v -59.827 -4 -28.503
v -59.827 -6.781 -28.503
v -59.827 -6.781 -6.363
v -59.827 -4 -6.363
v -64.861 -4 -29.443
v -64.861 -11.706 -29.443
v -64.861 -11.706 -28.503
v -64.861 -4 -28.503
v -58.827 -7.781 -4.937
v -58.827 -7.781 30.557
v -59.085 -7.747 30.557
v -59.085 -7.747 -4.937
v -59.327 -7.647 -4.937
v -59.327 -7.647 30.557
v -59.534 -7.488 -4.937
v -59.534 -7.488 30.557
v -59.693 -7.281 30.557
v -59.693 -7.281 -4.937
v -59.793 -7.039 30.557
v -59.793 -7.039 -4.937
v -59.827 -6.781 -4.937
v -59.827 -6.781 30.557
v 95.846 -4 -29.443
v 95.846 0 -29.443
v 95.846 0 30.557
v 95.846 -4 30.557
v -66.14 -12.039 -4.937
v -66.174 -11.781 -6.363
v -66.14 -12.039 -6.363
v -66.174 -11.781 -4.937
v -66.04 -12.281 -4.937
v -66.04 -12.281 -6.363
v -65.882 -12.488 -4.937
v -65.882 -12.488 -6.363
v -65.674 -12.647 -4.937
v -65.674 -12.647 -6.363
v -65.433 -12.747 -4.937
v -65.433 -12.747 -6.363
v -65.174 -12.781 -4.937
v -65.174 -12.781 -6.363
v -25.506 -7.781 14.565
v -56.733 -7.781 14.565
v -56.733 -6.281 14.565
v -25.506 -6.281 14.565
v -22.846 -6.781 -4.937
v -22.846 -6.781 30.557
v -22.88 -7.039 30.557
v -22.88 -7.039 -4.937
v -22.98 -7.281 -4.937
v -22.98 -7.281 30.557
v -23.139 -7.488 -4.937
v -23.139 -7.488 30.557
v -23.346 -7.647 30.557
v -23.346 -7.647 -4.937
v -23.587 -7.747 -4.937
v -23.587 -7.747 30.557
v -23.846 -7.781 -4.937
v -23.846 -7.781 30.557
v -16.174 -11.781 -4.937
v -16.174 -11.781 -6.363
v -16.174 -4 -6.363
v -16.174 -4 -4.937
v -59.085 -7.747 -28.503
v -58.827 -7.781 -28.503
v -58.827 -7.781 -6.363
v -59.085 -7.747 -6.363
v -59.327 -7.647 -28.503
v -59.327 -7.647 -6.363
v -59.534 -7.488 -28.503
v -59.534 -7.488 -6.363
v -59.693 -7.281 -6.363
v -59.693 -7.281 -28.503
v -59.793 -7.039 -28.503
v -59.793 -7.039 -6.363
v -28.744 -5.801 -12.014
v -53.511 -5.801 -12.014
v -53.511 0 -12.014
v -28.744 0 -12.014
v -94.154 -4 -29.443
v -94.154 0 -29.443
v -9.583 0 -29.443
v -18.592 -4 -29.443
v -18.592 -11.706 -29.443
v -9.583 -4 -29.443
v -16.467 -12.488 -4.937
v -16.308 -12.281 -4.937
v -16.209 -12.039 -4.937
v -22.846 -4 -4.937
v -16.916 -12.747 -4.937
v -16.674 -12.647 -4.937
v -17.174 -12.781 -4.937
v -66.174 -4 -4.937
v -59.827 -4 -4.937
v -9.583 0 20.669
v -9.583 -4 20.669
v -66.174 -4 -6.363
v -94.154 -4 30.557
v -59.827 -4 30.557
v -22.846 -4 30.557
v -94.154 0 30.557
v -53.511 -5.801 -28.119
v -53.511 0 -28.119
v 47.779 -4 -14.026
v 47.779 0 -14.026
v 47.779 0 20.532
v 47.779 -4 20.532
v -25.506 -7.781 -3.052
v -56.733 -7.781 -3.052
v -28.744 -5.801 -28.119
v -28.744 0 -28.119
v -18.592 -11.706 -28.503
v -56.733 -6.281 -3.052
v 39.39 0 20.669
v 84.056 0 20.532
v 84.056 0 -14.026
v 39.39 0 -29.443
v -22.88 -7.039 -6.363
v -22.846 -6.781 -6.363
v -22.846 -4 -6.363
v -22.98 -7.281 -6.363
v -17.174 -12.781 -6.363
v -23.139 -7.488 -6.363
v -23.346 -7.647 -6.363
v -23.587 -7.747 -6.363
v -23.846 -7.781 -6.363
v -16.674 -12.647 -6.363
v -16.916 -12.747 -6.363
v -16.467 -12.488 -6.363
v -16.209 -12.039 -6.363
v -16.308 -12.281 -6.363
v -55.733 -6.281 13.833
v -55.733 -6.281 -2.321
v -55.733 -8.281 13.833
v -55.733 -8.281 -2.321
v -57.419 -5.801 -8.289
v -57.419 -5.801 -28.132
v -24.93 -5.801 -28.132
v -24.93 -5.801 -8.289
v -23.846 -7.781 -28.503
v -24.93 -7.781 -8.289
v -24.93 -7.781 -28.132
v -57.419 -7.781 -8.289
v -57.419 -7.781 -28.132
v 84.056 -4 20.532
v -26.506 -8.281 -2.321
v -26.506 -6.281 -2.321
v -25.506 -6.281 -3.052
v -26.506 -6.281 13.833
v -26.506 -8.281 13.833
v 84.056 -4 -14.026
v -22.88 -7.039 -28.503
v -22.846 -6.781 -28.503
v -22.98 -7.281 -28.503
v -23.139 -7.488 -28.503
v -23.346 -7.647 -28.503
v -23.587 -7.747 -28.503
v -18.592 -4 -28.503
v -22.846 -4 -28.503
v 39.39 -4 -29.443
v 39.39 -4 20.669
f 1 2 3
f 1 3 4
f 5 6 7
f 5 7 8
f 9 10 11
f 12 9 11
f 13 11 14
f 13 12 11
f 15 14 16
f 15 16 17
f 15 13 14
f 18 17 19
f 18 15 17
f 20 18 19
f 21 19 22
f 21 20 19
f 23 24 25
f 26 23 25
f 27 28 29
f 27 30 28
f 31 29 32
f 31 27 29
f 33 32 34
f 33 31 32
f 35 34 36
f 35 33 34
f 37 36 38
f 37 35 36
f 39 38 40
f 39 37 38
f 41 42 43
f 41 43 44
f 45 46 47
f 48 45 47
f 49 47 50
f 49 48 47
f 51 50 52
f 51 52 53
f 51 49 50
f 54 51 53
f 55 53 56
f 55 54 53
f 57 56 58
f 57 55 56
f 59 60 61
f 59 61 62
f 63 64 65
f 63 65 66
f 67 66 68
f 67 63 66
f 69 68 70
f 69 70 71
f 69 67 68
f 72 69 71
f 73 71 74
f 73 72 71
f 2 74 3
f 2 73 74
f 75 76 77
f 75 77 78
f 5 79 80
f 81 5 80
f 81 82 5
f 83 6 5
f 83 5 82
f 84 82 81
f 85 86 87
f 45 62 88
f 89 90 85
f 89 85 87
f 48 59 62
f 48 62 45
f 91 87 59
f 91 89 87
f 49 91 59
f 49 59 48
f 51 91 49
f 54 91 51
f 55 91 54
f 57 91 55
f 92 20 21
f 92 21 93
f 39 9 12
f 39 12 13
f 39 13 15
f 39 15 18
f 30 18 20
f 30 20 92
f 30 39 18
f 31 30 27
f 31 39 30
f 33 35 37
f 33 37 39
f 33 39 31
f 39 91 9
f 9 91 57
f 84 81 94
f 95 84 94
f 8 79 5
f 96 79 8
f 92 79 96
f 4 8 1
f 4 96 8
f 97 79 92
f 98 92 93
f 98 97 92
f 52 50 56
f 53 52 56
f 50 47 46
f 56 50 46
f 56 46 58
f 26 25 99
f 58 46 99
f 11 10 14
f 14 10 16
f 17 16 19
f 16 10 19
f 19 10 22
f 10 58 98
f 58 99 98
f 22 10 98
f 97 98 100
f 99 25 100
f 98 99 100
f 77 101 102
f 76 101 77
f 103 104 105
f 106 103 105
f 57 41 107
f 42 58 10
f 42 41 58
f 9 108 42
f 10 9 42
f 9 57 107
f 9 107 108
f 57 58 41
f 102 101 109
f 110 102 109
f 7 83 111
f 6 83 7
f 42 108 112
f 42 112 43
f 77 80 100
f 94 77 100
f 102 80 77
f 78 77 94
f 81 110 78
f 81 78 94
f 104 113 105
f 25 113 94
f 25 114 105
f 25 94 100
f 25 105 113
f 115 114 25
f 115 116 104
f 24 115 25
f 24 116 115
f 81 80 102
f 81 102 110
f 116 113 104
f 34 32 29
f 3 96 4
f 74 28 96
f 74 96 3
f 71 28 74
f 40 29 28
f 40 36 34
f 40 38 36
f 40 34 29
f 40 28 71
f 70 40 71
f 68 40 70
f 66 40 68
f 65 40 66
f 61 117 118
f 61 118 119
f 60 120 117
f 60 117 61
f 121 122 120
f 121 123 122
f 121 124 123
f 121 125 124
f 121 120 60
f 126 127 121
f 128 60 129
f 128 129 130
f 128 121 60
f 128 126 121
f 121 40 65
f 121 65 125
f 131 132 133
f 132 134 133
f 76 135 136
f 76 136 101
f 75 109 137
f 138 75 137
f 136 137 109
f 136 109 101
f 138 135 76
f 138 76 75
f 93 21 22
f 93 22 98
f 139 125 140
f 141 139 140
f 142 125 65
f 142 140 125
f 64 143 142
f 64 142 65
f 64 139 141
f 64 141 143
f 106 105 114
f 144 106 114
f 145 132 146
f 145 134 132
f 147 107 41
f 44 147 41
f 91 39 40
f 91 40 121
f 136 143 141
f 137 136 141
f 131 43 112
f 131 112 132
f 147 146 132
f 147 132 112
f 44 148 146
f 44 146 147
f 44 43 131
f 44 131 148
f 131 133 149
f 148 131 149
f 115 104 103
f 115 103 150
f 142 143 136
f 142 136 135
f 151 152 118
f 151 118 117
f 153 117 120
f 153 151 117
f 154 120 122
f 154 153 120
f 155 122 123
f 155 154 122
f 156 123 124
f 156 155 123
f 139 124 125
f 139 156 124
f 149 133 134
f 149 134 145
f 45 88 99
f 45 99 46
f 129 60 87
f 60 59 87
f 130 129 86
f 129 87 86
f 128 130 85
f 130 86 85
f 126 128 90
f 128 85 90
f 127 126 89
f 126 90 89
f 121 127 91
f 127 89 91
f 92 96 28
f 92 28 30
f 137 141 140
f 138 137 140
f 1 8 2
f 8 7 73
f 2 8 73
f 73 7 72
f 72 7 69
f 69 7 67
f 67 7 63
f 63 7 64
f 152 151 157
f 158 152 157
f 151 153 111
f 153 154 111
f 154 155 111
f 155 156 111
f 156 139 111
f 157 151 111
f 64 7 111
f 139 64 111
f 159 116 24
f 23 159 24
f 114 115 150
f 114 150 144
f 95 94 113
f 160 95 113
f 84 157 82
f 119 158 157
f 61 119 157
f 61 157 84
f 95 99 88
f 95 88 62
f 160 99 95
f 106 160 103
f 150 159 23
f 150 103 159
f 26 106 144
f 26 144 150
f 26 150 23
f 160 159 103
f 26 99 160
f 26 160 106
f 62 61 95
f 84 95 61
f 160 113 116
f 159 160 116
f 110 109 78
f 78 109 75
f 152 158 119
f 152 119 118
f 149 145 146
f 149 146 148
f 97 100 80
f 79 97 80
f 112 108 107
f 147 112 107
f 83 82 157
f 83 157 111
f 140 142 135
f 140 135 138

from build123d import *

# Parameters (mm, degrees)
F0_W           = 36.2768345653
F0_H           = 34.5578843861
F1_DEPTH       = 4
F3_DEPTH       = 60
F4_W           = 24.767242372
F4_H           = 16.1051880568
F5_DEPTH       = 25
F6_DEPTH       = 28.2239038497
F7_W           = 32.4881970882
F7_H           = 19.8430884629
F7_W_2         = 24.767242372
F7_H_2         = 16.1051880568
F8_DEPTH       = 1.9791987725
F9_W           = 36.9808363765
F9_H           = 4
F10_DEPTH      = 0.9402669966
F11_W          = 29.2263142765
F11_H          = 16.1546287127
F12_DEPTH      = 0.5
F13_W          = 31.2264300883
F13_H          = 17.6170864142
F13_W_2        = 29.2263142765
F13_H_2        = 16.1546287127
F14_DEPTH      = 1.5
F15_W          = 7.6713270694
F15_H          = 1.4258362353
F15_W_2        = 34.9808363765
F15_W_3        = 7.3478365541
F16_DEPTH      = 5
F16_DEPTH_BACK = 4.8303701915
F17_R          = 1


with BuildPart() as f1:
    # F0 (on Front) → F1 (new body)
    with BuildSketch(Plane.XZ):
        Polygon((95.8462816477, 30.5567865909), (-94.1537183523, 30.5567865909), (-94.1537183523, -29.4432134091), (-9.5833106827, -29.4432134091), (-9.5833106827, 20.6685056415), (39.3904383138, 20.6685056415), (39.3904383138, -29.4432134091), (95.8462816477, -29.4432134091), align=None)
        with Locations((65.9178723932, 3.2533946408)):
            Rectangle(F0_W, F0_H, mode=Mode.SUBTRACT)
    extrude(amount=F1_DEPTH)

    # F2 (on face) → F3 (join)
    with BuildSketch(Plane(origin=(0, 0, -29.4432134091), x_dir=(1, 0, 0), z_dir=(0, 0, -1))):
        with BuildLine():
            Line((-59.8266199231, 6.7806394547), (-59.8266199231, 4))
            Line((-59.8266199231, 4), (-22.8457835466, 4))
            Line((-22.8457835466, 4), (-22.8457835466, 6.7806394547))
            ThreePointArc((-22.8457835466, 6.7806394547), (-23.1386767654, 7.4877462359), (-23.8457835466, 7.7806394547))
            Line((-23.8457835466, 7.7806394547), (-58.8266199231, 7.7806394547))
            ThreePointArc((-58.8266199231, 7.7806394547), (-59.5337267043, 7.4877462359), (-59.8266199231, 6.7806394547))
        make_face()
    extrude(amount=-F3_DEPTH)

    # F4 (on face) → F5 (join)
    with BuildSketch(Plane.XZ):
        with Locations((-41.1277525127, -20.0668377802)):
            Rectangle(F4_W, F4_H)
    extrude(amount=F5_DEPTH)

    # F6 (cut): a face of the model
    f6_faces = [f1.faces().sort_by_distance(p)[0] for p in [
        (-41.1277525127, -25, -20.0668377802),
    ]]
    extrude(f6_faces, amount=-F6_DEPTH, mode=Mode.SUBTRACT)

    # F7 (on face) → F8 (cut)
    with BuildSketch(Plane.XZ.offset(7.7806394547)):
        with Locations((-41.1744564772, -18.2105200365)):
            Rectangle(F7_W, F7_H)
        with Locations((-41.1277525127, -20.0668377802)):
            Rectangle(F7_W_2, F7_H_2, mode=Mode.SUBTRACT)
    extrude(amount=-F8_DEPTH, mode=Mode.SUBTRACT)

    # F9 (on face) → F10 (join)
    with BuildSketch(Plane(origin=(0, 0, -29.4432134091), x_dir=(1, 0, 0), z_dir=(0, 0, -1))):
        Polygon((-64.8606717587, 11.7061249912), (-64.8606717587, 0), (-59.8266199231, 0), (-59.8266199231, 4), (-22.8457835466, 4), (-22.8457835466, 0), (-18.5923743993, 0), (-18.5923743993, 11.7061249912), align=None)
        with Locations((-41.3362017348, 2)):
            Rectangle(F9_W, F9_H)
    extrude(amount=-F10_DEPTH)

    # F11 (on face) → F12 (join)
    with BuildSketch(Plane.XZ.offset(7.7806394547)):
        with Locations((-41.1195810884, 5.75606036)):
            Rectangle(F11_W, F11_H)
    extrude(amount=F12_DEPTH)

    # F13 (on face) → F14 (cut)
    with BuildSketch(Plane.XZ.offset(7.7806394547)):
        with Locations((-41.1195810884, 5.75606036)):
            Rectangle(F13_W, F13_H)
        with Locations((-41.1195810884, 5.75606036)):
            Rectangle(F13_W_2, F13_H_2, mode=Mode.SUBTRACT)
    extrude(amount=-F14_DEPTH, mode=Mode.SUBTRACT)

    # F15 (on face) → F16 (join, two sides)
    with BuildSketch(Plane.XZ.offset(7.7806394547)) as f16_sk:
        with Locations((-20.0101200119, -5.6498679332)):
            Rectangle(F15_W, F15_H)
        with Locations((-41.3362017348, -5.6498679332)):
            Rectangle(F15_W_2, F15_H)
        with Locations((-62.5005382001, -5.6498679332)):
            Rectangle(F15_W_3, F15_H)
    extrude(amount=F16_DEPTH)
    extrude(f16_sk.sketch, amount=-F16_DEPTH_BACK)

    # F17
    f17_edges = [f1.edges().sort_by_distance(p)[0] for p in [
        (-16.174456, -12.780639, -5.649868),
        (-66.174456, -12.780639, -5.649868),
    ]]
    fillet(f17_edges, radius=F17_R)


solid = f1.part
